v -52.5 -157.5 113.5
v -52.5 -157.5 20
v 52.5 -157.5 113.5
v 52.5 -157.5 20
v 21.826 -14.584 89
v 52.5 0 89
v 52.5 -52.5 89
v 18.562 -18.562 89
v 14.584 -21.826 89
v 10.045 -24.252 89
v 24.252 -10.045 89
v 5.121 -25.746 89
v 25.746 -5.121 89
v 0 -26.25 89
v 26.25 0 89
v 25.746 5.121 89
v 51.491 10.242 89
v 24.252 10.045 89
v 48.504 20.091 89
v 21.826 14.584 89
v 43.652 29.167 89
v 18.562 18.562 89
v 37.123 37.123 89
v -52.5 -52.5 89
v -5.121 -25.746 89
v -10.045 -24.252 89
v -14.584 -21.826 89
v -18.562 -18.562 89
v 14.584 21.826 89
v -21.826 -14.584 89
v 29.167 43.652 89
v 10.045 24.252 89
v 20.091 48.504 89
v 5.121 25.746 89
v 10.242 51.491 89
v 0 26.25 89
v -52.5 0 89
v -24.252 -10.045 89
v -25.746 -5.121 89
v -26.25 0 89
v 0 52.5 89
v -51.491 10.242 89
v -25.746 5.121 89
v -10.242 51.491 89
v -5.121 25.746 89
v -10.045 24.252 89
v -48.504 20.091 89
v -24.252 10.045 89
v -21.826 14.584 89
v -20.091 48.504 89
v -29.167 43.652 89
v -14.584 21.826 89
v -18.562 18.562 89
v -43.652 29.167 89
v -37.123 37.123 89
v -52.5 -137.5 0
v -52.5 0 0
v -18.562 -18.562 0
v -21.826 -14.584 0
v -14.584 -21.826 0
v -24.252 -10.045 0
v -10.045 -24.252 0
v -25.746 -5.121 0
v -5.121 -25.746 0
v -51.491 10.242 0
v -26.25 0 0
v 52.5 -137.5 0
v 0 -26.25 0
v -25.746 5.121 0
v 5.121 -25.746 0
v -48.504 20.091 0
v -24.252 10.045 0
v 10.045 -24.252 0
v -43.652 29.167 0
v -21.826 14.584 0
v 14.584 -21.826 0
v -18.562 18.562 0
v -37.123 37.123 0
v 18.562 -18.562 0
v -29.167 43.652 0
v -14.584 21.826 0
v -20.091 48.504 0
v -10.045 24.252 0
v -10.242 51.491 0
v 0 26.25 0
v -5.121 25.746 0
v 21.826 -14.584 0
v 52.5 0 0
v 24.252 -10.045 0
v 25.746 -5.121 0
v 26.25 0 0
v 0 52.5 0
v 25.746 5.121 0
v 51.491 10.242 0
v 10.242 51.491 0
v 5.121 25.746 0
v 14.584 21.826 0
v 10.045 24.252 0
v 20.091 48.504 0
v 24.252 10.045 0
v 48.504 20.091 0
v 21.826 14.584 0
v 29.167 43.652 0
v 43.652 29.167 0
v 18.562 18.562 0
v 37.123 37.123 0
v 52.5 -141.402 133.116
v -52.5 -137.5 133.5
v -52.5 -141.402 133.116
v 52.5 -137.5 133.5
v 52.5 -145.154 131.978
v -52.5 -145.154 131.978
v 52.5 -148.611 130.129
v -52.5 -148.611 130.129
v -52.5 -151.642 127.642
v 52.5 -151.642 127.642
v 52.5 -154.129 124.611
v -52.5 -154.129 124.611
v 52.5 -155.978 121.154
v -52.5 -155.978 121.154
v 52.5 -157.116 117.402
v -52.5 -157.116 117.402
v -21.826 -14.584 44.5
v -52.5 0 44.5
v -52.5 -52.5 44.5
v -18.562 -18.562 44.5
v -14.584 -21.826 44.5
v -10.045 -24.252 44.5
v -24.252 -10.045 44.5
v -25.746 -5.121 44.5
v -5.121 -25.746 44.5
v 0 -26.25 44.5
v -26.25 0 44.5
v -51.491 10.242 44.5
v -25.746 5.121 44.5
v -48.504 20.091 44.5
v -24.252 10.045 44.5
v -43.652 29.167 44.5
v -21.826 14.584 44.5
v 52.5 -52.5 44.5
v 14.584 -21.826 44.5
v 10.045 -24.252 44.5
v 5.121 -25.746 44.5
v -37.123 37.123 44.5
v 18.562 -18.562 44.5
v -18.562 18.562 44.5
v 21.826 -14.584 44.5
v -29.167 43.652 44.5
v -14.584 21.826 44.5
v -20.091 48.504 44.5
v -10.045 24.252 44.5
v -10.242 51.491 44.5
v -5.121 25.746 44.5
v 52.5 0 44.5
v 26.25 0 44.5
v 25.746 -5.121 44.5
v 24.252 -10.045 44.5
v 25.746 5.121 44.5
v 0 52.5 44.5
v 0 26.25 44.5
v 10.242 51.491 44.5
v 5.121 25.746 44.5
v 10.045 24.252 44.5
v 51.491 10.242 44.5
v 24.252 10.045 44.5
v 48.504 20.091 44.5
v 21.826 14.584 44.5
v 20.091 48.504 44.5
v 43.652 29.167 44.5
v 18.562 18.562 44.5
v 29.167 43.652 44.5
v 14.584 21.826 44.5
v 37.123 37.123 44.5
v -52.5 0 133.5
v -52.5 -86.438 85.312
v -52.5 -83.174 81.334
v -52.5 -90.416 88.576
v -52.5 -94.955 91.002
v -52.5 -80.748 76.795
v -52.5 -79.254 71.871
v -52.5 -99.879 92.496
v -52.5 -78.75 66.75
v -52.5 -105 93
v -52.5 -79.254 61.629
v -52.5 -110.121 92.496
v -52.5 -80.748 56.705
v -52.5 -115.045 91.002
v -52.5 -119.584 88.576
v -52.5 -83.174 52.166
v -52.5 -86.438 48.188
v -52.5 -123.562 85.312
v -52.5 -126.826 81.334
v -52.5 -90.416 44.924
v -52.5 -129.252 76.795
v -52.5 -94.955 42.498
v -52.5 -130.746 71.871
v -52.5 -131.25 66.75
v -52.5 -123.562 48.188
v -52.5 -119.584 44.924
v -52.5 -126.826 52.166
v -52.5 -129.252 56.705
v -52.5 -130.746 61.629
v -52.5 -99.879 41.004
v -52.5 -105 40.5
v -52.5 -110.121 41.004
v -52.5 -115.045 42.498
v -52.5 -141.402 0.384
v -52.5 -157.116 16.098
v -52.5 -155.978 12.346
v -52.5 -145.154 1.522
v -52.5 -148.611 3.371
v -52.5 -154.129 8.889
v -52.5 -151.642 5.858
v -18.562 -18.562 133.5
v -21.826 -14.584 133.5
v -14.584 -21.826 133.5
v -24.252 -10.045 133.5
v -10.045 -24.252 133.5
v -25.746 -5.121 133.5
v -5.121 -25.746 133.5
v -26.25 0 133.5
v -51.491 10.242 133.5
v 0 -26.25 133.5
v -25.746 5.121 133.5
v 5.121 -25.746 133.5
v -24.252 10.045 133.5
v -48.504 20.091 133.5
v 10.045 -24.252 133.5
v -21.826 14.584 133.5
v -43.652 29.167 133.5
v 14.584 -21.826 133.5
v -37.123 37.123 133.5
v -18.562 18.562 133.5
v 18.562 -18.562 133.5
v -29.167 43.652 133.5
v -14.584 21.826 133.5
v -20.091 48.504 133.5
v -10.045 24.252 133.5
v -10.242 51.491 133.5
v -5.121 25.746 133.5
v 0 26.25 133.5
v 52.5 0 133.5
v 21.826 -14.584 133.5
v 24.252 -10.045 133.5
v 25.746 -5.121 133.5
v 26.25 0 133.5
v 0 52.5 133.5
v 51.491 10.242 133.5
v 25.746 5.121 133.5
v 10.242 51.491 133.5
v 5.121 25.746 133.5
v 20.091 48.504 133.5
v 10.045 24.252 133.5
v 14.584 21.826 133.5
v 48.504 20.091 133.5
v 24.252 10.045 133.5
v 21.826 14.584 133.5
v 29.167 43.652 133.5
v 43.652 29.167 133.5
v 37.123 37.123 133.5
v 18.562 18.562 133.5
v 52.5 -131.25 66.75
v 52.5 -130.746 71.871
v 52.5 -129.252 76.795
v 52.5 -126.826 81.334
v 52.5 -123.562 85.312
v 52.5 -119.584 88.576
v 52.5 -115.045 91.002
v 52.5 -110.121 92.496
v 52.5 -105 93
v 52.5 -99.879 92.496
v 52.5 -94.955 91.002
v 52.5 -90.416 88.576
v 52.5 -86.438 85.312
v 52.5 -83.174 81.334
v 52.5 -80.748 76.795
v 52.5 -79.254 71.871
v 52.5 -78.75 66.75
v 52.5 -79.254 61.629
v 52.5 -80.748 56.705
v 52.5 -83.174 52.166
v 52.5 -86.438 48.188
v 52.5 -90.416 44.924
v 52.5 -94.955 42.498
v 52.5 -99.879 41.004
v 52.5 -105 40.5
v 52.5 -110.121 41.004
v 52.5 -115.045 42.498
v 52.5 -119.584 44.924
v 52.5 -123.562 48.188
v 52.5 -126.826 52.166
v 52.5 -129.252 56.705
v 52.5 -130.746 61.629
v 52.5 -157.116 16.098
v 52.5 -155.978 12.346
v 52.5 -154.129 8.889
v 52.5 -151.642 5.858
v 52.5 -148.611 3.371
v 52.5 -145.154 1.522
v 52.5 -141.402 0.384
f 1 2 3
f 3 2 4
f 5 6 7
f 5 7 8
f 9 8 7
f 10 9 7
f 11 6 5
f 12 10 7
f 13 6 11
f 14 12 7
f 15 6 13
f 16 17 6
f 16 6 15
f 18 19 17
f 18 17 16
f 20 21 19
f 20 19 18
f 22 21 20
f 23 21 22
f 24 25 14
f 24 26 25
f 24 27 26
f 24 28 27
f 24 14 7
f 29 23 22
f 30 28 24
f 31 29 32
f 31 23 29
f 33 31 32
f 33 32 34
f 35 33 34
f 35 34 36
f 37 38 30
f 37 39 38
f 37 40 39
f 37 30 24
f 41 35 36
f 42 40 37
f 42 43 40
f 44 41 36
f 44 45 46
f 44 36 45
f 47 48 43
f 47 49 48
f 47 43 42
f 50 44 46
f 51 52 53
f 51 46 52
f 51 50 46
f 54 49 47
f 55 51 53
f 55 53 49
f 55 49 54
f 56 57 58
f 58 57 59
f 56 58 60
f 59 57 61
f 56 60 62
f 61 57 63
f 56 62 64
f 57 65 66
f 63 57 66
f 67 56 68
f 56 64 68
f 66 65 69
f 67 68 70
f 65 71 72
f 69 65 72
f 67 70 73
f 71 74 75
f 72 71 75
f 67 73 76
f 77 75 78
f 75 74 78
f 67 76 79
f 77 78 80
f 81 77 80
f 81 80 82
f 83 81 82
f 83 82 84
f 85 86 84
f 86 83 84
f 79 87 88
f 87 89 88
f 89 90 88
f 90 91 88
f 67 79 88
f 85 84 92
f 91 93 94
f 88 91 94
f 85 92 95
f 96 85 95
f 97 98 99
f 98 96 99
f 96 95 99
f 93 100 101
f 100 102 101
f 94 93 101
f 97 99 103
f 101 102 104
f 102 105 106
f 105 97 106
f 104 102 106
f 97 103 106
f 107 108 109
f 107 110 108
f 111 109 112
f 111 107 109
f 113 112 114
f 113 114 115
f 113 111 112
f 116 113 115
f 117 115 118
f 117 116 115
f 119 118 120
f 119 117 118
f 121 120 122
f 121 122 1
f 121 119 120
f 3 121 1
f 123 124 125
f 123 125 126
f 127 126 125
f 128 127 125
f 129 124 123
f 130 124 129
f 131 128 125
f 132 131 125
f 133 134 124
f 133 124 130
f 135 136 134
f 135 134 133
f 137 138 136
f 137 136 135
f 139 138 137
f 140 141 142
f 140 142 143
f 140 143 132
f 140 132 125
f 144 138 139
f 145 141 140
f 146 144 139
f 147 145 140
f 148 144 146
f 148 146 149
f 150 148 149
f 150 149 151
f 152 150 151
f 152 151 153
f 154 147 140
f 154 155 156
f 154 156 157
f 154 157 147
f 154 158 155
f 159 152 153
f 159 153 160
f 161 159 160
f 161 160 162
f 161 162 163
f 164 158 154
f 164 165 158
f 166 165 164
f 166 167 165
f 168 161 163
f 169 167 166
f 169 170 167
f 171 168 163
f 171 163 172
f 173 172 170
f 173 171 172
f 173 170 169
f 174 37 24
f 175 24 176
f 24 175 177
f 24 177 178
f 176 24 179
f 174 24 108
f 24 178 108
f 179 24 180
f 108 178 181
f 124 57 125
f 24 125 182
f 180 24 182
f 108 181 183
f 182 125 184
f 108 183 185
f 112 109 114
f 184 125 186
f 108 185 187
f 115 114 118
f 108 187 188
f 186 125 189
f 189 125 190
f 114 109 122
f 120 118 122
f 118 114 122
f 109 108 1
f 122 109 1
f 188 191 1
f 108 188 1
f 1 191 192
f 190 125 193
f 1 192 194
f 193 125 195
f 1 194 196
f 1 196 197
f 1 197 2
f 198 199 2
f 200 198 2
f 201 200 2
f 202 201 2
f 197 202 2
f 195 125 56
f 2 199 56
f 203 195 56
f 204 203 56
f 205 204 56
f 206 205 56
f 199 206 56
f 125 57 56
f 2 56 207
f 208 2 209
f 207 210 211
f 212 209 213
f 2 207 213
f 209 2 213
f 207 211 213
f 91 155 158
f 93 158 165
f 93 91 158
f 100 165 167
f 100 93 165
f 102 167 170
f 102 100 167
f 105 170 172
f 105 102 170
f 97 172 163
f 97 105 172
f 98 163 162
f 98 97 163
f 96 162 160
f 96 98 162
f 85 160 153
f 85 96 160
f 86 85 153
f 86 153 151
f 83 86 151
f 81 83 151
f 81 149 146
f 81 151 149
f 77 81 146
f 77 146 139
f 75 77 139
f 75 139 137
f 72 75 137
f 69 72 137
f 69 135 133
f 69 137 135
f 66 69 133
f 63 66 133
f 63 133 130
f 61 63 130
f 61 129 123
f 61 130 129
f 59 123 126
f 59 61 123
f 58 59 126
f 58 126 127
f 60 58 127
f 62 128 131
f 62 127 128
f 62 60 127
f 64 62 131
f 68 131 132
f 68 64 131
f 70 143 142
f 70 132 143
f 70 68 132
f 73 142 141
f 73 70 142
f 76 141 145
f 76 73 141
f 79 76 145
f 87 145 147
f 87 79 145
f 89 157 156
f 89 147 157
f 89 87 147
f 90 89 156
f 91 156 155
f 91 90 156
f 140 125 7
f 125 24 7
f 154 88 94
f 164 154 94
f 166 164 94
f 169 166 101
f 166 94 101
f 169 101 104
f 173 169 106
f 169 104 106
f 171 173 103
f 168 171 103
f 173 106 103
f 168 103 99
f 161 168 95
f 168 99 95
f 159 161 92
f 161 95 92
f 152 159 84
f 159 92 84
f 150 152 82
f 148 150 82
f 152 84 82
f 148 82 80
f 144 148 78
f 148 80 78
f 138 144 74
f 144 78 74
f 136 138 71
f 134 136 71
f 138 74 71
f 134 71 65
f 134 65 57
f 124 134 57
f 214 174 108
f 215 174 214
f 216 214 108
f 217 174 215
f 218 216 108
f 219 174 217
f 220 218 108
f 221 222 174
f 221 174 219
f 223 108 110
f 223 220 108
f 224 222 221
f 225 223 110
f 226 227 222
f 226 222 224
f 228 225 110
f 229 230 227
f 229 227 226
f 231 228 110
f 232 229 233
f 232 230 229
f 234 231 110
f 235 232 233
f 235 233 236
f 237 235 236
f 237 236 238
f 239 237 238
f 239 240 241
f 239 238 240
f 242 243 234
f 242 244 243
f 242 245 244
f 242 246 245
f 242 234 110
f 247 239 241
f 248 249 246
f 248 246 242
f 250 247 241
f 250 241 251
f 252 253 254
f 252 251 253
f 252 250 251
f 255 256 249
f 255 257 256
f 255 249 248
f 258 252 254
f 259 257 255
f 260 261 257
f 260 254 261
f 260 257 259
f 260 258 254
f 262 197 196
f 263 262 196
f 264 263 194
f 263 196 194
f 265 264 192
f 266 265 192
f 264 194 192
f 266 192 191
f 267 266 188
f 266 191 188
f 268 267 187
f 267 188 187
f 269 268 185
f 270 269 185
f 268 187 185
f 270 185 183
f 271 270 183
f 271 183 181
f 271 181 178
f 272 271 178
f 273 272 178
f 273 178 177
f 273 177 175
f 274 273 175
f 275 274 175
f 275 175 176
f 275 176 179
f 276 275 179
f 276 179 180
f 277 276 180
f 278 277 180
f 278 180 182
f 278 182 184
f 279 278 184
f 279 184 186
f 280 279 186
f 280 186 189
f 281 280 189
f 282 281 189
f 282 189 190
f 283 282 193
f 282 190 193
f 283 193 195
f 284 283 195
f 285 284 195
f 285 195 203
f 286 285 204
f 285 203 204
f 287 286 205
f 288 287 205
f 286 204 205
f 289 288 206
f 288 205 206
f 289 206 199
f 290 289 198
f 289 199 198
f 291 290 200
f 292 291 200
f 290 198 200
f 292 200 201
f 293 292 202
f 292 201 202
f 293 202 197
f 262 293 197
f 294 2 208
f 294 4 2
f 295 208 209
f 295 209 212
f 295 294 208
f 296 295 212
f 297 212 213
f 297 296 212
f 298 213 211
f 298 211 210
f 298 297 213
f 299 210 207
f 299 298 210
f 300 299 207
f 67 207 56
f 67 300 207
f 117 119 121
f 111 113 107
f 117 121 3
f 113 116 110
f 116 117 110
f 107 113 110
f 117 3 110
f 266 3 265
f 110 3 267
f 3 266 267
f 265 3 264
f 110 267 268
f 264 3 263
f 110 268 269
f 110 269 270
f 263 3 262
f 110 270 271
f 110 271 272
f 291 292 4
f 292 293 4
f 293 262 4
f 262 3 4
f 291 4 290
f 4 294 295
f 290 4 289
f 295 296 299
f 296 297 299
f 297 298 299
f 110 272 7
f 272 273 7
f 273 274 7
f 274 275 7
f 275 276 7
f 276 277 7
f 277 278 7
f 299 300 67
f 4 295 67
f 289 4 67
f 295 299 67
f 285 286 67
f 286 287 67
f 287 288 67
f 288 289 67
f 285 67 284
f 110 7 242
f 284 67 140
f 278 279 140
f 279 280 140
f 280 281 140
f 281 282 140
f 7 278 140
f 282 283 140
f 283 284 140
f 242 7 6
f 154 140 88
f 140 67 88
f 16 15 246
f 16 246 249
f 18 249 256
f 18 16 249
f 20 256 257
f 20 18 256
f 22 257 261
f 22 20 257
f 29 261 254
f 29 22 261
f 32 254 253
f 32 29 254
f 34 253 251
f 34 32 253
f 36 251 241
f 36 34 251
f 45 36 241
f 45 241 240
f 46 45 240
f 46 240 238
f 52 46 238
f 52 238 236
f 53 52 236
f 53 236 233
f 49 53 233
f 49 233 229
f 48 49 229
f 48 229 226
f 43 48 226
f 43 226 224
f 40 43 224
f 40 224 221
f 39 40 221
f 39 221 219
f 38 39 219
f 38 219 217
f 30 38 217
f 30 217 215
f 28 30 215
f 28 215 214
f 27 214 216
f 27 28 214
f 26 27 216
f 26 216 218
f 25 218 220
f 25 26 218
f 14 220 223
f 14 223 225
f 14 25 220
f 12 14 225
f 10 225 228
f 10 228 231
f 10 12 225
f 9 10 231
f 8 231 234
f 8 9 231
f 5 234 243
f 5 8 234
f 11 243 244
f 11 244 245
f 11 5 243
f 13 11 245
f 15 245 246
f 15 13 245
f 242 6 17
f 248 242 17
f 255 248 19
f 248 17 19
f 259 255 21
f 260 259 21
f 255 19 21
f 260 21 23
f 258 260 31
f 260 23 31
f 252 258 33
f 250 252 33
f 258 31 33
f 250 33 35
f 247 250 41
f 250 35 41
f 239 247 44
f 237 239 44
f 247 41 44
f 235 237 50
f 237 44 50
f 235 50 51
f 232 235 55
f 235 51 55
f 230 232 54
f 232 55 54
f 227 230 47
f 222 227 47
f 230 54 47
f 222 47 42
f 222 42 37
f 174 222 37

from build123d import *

# Parameters (mm, degrees)
SKETCH1_R           = 26.25
BOSS_EXTRUDE1_DEPTH = 133.5
SKETCH3_R           = 26.25
CUT_EXTRUDE1_DEPTH  = 232.63225164
CUT_EXTRUDE2_START  = -210
CUT_EXTRUDE2_DEPTH  = 105
FILLET1_R           = 20


with BuildPart() as part:
    # Sketch1 → Boss-Extrude1 (new body)
    with BuildSketch(Plane.XY):
        with BuildLine():
            Line((-52.5, 0), (-52.5, -157.5))
            Line((-52.5, -157.5), (52.5, -157.5))
            Line((52.5, -157.5), (52.5, 0))
            ThreePointArc((52.5, 0), (0, 52.5), (-52.5, 0))
        make_face()
        Circle(SKETCH1_R, mode=Mode.SUBTRACT)
    extrude(amount=BOSS_EXTRUDE1_DEPTH)

    # Sketch3 → Cut-Extrude1 (cut, through all)
    with BuildSketch(Plane.ZY.offset(52.5)):
        with Locations(Location((66.75, -105, 0), (0, 0, 270))):
            Circle(SKETCH3_R)
    extrude(amount=-CUT_EXTRUDE1_DEPTH, mode=Mode.SUBTRACT)

    # Sketch6 → Cut-Extrude2 (cut)
    with BuildSketch(Plane.XZ.offset(157.5).offset(CUT_EXTRUDE2_START)):
        Polygon((-52.5, 66.75), (-52.5, 44.5), (52.5, 44.5), (52.5, 89), (-52.5, 89), align=None)
    extrude(amount=CUT_EXTRUDE2_DEPTH, mode=Mode.SUBTRACT)

    # Fillet1
    fillet1_edges = [part.edges().sort_by_distance(p)[0] for p in [
        (0, -157.5, 133.5),
        (0, -157.5, 0),
    ]]
    fillet(fillet1_edges, radius=FILLET1_R)


solid = part.part
